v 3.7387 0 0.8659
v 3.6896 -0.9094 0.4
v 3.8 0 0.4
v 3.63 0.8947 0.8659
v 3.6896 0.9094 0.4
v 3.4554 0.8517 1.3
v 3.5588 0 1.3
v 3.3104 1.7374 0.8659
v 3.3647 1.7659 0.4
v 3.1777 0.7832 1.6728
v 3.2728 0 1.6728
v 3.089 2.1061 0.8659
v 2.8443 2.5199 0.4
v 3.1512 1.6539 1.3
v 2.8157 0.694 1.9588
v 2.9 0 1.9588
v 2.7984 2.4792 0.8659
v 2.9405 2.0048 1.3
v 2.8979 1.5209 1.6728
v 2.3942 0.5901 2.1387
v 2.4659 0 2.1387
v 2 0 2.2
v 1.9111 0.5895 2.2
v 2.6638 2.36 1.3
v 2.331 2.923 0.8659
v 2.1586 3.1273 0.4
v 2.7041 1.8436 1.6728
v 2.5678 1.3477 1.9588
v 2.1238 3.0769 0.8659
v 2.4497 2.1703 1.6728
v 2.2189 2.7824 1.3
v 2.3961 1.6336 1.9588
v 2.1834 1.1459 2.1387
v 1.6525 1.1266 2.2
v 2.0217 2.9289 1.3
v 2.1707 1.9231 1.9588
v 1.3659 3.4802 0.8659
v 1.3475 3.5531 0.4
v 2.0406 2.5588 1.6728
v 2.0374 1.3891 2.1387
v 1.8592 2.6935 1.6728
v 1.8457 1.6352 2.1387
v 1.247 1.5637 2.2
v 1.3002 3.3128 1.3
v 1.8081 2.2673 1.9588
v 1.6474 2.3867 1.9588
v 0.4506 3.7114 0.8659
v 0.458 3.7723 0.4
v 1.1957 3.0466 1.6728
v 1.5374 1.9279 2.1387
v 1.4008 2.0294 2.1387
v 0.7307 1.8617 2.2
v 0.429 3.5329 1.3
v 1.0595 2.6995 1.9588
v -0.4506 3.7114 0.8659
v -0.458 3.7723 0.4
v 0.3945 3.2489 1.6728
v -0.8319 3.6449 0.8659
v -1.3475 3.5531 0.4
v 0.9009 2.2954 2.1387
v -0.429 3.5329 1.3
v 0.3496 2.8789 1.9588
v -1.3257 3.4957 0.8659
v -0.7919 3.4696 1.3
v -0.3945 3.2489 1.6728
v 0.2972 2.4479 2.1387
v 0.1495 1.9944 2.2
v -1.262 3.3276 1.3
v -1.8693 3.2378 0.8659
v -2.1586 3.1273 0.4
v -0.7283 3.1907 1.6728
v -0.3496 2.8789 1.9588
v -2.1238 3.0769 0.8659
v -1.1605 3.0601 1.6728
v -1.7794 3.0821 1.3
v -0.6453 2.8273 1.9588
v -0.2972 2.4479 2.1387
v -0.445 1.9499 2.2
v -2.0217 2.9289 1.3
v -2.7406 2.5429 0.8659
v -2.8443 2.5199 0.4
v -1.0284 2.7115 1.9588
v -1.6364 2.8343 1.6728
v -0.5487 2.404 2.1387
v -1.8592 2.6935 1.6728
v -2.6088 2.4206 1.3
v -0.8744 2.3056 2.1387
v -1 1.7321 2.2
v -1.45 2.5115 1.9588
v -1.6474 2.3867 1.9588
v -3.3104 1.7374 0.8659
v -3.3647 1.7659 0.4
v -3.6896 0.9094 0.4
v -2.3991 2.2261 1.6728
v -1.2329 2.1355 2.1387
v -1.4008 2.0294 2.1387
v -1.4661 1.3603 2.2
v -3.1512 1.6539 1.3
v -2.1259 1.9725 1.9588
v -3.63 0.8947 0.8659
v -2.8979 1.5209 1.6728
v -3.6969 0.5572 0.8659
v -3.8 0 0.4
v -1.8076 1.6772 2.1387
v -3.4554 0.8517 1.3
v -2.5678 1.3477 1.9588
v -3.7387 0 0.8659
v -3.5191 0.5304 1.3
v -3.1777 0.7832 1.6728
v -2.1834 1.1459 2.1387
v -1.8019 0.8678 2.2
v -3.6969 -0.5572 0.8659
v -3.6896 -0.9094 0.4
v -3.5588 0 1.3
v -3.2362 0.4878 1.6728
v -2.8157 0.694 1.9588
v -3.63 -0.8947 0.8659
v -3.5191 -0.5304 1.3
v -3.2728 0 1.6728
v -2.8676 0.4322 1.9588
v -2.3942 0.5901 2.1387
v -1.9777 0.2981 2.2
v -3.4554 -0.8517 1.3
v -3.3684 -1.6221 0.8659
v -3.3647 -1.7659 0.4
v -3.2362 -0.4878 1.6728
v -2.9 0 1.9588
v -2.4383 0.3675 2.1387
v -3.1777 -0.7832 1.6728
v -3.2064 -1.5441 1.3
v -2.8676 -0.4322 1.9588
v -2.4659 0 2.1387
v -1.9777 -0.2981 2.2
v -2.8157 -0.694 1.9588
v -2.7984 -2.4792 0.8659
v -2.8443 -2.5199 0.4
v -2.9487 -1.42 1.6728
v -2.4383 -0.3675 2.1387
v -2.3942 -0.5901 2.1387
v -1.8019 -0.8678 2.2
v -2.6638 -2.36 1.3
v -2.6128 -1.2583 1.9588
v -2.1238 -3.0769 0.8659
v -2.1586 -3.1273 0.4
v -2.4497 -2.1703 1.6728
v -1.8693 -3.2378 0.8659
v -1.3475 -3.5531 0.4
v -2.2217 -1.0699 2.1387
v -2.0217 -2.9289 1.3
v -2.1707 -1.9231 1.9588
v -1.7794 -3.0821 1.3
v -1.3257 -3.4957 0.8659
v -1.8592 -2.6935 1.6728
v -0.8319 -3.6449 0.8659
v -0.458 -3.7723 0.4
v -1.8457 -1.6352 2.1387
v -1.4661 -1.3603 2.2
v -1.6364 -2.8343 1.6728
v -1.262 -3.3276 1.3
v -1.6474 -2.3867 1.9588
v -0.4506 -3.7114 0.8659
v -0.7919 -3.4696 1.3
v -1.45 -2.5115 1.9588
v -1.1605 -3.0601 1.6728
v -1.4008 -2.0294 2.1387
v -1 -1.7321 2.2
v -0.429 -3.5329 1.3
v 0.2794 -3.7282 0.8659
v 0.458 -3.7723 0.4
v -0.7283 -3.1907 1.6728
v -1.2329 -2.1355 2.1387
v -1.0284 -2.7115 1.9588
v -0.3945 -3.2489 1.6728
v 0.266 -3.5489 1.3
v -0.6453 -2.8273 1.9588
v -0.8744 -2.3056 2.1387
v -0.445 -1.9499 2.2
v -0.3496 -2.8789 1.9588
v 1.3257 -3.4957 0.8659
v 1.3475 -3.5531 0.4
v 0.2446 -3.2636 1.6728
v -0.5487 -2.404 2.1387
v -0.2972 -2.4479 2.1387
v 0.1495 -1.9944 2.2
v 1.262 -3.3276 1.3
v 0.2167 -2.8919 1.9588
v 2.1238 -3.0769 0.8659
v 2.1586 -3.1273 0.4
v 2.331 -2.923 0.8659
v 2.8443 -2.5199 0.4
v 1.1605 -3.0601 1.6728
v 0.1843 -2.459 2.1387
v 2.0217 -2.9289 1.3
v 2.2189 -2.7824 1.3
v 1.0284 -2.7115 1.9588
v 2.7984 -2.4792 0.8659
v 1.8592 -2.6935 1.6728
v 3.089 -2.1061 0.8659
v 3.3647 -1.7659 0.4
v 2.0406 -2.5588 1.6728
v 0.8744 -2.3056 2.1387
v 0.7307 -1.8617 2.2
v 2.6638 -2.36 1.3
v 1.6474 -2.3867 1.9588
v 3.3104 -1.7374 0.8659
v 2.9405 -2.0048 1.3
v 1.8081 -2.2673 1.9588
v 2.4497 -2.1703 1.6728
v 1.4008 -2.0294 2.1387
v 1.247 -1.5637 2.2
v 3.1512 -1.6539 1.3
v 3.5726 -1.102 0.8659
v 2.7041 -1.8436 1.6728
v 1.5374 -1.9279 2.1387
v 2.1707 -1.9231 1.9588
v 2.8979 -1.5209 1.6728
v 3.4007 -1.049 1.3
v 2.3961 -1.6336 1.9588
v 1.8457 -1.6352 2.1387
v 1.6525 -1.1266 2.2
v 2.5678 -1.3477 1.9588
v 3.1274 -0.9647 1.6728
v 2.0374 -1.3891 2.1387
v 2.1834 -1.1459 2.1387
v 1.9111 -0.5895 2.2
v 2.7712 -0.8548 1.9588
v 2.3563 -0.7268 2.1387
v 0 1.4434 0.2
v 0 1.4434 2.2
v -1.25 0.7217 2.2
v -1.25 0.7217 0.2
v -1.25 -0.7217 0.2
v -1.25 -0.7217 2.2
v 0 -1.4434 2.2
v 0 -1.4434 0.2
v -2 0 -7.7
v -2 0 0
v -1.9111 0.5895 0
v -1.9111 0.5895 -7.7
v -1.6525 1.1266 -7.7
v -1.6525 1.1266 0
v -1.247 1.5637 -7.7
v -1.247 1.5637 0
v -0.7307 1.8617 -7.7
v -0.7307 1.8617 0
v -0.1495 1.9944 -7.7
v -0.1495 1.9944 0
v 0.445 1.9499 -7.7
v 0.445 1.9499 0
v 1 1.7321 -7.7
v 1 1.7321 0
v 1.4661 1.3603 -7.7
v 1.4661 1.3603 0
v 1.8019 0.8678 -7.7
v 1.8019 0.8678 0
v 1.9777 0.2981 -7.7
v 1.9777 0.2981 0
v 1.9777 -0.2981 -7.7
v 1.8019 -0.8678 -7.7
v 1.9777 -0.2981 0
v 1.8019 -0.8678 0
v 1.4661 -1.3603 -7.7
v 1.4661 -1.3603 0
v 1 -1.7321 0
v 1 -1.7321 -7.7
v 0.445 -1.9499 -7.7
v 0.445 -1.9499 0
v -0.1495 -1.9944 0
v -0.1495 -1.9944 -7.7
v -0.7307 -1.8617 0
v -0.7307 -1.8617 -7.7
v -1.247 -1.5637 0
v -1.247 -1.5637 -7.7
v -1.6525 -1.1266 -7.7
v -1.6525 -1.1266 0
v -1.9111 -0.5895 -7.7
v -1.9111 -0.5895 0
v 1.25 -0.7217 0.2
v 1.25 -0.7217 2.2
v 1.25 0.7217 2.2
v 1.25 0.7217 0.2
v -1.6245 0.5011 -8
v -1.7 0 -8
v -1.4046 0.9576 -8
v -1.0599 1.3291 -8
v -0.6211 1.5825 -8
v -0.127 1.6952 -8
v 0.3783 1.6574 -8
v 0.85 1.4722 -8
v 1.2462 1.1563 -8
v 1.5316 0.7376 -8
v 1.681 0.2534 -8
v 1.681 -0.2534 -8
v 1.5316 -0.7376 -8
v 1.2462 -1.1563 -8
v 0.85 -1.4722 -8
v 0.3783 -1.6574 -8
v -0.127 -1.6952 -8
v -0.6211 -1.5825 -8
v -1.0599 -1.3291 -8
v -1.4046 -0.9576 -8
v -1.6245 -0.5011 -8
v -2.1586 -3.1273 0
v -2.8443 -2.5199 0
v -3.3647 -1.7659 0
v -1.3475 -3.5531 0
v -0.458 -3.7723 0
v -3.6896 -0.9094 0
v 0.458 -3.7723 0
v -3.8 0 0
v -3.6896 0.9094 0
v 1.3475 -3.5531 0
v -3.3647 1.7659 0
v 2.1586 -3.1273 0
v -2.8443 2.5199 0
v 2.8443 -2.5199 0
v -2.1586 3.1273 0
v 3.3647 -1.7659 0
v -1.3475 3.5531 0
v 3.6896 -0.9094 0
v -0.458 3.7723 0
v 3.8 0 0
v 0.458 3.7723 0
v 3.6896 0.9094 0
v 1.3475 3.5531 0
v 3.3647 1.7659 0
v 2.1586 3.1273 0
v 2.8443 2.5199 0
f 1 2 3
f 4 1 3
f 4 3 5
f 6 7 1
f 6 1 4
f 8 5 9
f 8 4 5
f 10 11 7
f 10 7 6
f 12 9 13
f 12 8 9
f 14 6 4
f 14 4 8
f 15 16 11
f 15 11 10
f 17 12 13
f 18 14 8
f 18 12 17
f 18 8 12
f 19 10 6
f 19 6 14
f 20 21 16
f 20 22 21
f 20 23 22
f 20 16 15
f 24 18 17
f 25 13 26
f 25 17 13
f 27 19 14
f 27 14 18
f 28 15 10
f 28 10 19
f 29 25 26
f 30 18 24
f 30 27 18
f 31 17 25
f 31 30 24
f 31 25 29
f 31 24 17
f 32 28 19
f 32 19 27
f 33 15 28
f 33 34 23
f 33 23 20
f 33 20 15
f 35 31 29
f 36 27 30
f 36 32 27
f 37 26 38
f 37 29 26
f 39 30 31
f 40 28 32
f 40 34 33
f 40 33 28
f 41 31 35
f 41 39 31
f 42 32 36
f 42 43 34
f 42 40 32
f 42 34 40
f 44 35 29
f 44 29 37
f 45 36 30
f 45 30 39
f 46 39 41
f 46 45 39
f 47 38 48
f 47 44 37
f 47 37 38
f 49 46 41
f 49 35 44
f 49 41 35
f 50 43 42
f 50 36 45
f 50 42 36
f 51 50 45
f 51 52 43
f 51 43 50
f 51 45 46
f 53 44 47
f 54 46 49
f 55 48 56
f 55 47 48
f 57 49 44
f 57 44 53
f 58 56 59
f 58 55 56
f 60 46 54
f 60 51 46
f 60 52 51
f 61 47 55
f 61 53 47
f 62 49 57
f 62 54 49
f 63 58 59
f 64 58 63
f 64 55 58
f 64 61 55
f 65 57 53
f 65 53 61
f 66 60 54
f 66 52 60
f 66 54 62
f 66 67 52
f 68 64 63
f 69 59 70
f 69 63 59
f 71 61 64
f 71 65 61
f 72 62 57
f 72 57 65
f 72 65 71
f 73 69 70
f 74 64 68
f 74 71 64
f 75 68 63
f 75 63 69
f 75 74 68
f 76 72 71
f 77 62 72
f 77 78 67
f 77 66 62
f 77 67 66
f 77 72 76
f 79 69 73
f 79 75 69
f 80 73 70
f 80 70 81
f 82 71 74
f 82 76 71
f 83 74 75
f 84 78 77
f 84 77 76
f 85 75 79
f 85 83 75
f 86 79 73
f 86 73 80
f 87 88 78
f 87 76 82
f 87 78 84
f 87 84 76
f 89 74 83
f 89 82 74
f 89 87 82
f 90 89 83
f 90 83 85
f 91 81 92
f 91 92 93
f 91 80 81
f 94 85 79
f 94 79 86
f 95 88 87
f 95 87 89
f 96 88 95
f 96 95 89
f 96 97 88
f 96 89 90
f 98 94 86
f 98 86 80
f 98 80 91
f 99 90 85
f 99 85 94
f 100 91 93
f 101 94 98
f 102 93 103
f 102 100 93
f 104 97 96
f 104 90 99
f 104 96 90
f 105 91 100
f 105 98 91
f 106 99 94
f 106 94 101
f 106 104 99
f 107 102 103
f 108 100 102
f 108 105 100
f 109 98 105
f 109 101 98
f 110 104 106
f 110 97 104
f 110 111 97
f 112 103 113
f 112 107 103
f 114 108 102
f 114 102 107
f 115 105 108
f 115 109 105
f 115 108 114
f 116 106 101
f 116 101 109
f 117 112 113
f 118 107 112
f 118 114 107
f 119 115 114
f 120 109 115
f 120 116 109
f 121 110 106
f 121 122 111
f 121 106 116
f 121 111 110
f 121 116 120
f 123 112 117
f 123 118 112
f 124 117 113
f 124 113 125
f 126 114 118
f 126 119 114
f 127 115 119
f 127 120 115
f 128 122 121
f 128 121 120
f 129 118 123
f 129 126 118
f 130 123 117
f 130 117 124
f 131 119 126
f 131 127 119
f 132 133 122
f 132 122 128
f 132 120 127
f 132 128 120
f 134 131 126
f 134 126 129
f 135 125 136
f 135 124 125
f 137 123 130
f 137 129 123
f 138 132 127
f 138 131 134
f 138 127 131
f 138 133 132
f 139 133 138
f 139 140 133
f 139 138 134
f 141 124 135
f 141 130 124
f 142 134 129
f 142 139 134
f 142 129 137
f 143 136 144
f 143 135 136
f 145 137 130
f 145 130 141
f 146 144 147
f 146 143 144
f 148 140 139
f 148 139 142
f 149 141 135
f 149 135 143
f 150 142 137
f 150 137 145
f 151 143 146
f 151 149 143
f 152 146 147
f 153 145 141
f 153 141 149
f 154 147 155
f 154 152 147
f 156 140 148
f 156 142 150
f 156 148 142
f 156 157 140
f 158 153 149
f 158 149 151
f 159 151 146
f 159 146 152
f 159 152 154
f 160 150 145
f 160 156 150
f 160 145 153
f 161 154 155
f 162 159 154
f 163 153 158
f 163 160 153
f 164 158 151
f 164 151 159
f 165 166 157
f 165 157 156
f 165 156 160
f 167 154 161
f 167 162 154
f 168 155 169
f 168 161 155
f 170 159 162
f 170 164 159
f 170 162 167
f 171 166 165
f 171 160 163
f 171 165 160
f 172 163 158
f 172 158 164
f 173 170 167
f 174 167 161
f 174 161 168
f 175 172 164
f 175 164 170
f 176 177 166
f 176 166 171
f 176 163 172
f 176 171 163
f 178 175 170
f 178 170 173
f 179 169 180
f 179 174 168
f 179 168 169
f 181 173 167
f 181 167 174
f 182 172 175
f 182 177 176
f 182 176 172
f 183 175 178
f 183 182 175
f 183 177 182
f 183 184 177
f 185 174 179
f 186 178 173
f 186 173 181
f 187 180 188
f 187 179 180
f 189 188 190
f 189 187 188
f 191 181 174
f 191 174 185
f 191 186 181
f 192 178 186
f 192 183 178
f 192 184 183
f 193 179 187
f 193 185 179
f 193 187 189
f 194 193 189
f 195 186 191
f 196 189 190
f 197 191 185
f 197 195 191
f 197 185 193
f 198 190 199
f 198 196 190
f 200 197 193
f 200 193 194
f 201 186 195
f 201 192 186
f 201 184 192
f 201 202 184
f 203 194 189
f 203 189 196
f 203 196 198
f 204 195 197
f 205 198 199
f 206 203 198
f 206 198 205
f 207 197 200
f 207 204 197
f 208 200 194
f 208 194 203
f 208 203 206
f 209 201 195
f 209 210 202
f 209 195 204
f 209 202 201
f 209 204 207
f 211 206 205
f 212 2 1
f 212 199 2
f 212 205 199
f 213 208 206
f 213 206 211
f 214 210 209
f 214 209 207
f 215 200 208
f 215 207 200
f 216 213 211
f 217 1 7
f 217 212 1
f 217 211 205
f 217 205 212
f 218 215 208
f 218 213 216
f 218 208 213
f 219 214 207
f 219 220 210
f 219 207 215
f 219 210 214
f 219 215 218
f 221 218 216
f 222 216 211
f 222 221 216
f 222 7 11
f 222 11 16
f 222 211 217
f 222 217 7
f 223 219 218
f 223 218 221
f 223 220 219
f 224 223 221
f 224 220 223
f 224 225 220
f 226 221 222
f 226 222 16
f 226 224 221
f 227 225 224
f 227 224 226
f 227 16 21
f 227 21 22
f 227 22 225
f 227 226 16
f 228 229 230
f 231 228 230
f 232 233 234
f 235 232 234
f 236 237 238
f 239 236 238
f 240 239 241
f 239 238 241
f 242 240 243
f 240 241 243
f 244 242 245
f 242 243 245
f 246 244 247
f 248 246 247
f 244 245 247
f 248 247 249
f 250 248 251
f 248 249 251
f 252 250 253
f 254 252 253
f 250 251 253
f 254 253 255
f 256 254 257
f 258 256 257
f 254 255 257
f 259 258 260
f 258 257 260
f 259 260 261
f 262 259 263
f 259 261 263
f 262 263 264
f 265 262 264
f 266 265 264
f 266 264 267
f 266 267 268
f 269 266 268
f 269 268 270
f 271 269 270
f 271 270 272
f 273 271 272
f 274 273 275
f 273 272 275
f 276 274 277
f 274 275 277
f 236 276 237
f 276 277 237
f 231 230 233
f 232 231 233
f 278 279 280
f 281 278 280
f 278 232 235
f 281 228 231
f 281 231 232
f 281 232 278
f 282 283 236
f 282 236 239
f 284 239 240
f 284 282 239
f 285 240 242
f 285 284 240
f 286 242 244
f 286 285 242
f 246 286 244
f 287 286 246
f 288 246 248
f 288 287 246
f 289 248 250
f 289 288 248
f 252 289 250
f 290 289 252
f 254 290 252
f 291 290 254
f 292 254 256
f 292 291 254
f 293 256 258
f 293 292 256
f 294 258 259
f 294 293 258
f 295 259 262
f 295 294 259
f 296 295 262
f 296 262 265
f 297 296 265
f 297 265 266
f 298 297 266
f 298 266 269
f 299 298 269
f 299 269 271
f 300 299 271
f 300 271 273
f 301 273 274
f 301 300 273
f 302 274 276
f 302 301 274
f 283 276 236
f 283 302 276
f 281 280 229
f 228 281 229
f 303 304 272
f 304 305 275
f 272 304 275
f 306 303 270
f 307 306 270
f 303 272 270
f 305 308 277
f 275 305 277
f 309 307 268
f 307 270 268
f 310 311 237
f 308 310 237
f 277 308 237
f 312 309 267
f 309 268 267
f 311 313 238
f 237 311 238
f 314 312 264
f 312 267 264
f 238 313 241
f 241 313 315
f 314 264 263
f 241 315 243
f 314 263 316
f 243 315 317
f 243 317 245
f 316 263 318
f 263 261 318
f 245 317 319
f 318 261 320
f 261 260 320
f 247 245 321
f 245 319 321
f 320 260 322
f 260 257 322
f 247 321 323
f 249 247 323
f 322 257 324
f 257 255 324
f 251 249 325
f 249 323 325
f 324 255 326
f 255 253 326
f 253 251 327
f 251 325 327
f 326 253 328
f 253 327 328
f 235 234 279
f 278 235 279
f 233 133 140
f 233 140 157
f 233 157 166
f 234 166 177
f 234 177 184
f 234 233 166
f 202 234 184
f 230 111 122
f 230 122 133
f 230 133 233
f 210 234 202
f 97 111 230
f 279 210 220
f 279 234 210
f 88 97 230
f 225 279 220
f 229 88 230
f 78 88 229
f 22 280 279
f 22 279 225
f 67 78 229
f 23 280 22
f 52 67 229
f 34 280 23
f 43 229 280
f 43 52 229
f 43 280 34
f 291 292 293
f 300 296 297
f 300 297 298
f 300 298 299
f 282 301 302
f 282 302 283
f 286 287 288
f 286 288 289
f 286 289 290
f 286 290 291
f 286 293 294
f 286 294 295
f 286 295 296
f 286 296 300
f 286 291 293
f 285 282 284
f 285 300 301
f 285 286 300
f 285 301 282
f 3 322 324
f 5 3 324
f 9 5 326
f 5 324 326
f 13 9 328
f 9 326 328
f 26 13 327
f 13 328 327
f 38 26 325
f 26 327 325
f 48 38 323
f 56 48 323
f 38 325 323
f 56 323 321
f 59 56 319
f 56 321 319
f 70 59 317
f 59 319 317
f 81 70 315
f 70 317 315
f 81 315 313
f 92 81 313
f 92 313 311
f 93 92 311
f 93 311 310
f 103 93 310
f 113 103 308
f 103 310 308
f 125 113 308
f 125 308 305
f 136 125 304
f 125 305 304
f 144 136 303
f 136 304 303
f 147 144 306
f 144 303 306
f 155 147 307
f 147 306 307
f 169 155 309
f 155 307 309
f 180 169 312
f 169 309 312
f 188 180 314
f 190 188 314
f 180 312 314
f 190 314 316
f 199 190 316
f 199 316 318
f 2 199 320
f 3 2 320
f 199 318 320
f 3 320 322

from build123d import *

# Parameters (mm, degrees)
SKETCH1_R           = 3.8
BOSS_EXTRUDE1_DEPTH = 2.2
SKETCH2_R           = 2
BOSS_EXTRUDE2_DEPTH = 8
CHAMFER1_SIZE       = 0.3
CUT_EXTRUDE1_DEPTH  = 2
FILLET1_R           = 1.8


with BuildPart() as part:
    # Sketch1 → Boss-Extrude1 (new body)
    with BuildSketch(Plane.XY):
        Circle(SKETCH1_R)
    extrude(amount=BOSS_EXTRUDE1_DEPTH)

    # Sketch2 → Boss-Extrude2 (add)
    with BuildSketch(Plane(origin=(0, 0, 0), x_dir=(-1, 0, 0), z_dir=(0, 0, -1))):
        Circle(SKETCH2_R)
    extrude(amount=BOSS_EXTRUDE2_DEPTH)

    # Chamfer1
    chamfer1_edges = [part.edges().sort_by_distance(p)[0] for p in [
        (2, 0, -8),
    ]]
    chamfer(chamfer1_edges, length=CHAMFER1_SIZE)

    # Sketch3 → Cut-Extrude1 (cut)
    with BuildSketch(Plane.XY.offset(2.2)):
        Polygon((0, 1.443375673), (-1.25, 0.721687836), (-1.25, -0.721687836), (0, -1.443375673), (1.25, -0.721687836), (1.25, 0.721687836), align=None)
    extrude(amount=-CUT_EXTRUDE1_DEPTH, mode=Mode.SUBTRACT)

    # Fillet1
    fillet1_edges = [part.edges().sort_by_distance(p)[0] for p in [
        (-3.8, 0, 2.2),
    ]]
    fillet(fillet1_edges, radius=FILLET1_R)


solid = part.part
